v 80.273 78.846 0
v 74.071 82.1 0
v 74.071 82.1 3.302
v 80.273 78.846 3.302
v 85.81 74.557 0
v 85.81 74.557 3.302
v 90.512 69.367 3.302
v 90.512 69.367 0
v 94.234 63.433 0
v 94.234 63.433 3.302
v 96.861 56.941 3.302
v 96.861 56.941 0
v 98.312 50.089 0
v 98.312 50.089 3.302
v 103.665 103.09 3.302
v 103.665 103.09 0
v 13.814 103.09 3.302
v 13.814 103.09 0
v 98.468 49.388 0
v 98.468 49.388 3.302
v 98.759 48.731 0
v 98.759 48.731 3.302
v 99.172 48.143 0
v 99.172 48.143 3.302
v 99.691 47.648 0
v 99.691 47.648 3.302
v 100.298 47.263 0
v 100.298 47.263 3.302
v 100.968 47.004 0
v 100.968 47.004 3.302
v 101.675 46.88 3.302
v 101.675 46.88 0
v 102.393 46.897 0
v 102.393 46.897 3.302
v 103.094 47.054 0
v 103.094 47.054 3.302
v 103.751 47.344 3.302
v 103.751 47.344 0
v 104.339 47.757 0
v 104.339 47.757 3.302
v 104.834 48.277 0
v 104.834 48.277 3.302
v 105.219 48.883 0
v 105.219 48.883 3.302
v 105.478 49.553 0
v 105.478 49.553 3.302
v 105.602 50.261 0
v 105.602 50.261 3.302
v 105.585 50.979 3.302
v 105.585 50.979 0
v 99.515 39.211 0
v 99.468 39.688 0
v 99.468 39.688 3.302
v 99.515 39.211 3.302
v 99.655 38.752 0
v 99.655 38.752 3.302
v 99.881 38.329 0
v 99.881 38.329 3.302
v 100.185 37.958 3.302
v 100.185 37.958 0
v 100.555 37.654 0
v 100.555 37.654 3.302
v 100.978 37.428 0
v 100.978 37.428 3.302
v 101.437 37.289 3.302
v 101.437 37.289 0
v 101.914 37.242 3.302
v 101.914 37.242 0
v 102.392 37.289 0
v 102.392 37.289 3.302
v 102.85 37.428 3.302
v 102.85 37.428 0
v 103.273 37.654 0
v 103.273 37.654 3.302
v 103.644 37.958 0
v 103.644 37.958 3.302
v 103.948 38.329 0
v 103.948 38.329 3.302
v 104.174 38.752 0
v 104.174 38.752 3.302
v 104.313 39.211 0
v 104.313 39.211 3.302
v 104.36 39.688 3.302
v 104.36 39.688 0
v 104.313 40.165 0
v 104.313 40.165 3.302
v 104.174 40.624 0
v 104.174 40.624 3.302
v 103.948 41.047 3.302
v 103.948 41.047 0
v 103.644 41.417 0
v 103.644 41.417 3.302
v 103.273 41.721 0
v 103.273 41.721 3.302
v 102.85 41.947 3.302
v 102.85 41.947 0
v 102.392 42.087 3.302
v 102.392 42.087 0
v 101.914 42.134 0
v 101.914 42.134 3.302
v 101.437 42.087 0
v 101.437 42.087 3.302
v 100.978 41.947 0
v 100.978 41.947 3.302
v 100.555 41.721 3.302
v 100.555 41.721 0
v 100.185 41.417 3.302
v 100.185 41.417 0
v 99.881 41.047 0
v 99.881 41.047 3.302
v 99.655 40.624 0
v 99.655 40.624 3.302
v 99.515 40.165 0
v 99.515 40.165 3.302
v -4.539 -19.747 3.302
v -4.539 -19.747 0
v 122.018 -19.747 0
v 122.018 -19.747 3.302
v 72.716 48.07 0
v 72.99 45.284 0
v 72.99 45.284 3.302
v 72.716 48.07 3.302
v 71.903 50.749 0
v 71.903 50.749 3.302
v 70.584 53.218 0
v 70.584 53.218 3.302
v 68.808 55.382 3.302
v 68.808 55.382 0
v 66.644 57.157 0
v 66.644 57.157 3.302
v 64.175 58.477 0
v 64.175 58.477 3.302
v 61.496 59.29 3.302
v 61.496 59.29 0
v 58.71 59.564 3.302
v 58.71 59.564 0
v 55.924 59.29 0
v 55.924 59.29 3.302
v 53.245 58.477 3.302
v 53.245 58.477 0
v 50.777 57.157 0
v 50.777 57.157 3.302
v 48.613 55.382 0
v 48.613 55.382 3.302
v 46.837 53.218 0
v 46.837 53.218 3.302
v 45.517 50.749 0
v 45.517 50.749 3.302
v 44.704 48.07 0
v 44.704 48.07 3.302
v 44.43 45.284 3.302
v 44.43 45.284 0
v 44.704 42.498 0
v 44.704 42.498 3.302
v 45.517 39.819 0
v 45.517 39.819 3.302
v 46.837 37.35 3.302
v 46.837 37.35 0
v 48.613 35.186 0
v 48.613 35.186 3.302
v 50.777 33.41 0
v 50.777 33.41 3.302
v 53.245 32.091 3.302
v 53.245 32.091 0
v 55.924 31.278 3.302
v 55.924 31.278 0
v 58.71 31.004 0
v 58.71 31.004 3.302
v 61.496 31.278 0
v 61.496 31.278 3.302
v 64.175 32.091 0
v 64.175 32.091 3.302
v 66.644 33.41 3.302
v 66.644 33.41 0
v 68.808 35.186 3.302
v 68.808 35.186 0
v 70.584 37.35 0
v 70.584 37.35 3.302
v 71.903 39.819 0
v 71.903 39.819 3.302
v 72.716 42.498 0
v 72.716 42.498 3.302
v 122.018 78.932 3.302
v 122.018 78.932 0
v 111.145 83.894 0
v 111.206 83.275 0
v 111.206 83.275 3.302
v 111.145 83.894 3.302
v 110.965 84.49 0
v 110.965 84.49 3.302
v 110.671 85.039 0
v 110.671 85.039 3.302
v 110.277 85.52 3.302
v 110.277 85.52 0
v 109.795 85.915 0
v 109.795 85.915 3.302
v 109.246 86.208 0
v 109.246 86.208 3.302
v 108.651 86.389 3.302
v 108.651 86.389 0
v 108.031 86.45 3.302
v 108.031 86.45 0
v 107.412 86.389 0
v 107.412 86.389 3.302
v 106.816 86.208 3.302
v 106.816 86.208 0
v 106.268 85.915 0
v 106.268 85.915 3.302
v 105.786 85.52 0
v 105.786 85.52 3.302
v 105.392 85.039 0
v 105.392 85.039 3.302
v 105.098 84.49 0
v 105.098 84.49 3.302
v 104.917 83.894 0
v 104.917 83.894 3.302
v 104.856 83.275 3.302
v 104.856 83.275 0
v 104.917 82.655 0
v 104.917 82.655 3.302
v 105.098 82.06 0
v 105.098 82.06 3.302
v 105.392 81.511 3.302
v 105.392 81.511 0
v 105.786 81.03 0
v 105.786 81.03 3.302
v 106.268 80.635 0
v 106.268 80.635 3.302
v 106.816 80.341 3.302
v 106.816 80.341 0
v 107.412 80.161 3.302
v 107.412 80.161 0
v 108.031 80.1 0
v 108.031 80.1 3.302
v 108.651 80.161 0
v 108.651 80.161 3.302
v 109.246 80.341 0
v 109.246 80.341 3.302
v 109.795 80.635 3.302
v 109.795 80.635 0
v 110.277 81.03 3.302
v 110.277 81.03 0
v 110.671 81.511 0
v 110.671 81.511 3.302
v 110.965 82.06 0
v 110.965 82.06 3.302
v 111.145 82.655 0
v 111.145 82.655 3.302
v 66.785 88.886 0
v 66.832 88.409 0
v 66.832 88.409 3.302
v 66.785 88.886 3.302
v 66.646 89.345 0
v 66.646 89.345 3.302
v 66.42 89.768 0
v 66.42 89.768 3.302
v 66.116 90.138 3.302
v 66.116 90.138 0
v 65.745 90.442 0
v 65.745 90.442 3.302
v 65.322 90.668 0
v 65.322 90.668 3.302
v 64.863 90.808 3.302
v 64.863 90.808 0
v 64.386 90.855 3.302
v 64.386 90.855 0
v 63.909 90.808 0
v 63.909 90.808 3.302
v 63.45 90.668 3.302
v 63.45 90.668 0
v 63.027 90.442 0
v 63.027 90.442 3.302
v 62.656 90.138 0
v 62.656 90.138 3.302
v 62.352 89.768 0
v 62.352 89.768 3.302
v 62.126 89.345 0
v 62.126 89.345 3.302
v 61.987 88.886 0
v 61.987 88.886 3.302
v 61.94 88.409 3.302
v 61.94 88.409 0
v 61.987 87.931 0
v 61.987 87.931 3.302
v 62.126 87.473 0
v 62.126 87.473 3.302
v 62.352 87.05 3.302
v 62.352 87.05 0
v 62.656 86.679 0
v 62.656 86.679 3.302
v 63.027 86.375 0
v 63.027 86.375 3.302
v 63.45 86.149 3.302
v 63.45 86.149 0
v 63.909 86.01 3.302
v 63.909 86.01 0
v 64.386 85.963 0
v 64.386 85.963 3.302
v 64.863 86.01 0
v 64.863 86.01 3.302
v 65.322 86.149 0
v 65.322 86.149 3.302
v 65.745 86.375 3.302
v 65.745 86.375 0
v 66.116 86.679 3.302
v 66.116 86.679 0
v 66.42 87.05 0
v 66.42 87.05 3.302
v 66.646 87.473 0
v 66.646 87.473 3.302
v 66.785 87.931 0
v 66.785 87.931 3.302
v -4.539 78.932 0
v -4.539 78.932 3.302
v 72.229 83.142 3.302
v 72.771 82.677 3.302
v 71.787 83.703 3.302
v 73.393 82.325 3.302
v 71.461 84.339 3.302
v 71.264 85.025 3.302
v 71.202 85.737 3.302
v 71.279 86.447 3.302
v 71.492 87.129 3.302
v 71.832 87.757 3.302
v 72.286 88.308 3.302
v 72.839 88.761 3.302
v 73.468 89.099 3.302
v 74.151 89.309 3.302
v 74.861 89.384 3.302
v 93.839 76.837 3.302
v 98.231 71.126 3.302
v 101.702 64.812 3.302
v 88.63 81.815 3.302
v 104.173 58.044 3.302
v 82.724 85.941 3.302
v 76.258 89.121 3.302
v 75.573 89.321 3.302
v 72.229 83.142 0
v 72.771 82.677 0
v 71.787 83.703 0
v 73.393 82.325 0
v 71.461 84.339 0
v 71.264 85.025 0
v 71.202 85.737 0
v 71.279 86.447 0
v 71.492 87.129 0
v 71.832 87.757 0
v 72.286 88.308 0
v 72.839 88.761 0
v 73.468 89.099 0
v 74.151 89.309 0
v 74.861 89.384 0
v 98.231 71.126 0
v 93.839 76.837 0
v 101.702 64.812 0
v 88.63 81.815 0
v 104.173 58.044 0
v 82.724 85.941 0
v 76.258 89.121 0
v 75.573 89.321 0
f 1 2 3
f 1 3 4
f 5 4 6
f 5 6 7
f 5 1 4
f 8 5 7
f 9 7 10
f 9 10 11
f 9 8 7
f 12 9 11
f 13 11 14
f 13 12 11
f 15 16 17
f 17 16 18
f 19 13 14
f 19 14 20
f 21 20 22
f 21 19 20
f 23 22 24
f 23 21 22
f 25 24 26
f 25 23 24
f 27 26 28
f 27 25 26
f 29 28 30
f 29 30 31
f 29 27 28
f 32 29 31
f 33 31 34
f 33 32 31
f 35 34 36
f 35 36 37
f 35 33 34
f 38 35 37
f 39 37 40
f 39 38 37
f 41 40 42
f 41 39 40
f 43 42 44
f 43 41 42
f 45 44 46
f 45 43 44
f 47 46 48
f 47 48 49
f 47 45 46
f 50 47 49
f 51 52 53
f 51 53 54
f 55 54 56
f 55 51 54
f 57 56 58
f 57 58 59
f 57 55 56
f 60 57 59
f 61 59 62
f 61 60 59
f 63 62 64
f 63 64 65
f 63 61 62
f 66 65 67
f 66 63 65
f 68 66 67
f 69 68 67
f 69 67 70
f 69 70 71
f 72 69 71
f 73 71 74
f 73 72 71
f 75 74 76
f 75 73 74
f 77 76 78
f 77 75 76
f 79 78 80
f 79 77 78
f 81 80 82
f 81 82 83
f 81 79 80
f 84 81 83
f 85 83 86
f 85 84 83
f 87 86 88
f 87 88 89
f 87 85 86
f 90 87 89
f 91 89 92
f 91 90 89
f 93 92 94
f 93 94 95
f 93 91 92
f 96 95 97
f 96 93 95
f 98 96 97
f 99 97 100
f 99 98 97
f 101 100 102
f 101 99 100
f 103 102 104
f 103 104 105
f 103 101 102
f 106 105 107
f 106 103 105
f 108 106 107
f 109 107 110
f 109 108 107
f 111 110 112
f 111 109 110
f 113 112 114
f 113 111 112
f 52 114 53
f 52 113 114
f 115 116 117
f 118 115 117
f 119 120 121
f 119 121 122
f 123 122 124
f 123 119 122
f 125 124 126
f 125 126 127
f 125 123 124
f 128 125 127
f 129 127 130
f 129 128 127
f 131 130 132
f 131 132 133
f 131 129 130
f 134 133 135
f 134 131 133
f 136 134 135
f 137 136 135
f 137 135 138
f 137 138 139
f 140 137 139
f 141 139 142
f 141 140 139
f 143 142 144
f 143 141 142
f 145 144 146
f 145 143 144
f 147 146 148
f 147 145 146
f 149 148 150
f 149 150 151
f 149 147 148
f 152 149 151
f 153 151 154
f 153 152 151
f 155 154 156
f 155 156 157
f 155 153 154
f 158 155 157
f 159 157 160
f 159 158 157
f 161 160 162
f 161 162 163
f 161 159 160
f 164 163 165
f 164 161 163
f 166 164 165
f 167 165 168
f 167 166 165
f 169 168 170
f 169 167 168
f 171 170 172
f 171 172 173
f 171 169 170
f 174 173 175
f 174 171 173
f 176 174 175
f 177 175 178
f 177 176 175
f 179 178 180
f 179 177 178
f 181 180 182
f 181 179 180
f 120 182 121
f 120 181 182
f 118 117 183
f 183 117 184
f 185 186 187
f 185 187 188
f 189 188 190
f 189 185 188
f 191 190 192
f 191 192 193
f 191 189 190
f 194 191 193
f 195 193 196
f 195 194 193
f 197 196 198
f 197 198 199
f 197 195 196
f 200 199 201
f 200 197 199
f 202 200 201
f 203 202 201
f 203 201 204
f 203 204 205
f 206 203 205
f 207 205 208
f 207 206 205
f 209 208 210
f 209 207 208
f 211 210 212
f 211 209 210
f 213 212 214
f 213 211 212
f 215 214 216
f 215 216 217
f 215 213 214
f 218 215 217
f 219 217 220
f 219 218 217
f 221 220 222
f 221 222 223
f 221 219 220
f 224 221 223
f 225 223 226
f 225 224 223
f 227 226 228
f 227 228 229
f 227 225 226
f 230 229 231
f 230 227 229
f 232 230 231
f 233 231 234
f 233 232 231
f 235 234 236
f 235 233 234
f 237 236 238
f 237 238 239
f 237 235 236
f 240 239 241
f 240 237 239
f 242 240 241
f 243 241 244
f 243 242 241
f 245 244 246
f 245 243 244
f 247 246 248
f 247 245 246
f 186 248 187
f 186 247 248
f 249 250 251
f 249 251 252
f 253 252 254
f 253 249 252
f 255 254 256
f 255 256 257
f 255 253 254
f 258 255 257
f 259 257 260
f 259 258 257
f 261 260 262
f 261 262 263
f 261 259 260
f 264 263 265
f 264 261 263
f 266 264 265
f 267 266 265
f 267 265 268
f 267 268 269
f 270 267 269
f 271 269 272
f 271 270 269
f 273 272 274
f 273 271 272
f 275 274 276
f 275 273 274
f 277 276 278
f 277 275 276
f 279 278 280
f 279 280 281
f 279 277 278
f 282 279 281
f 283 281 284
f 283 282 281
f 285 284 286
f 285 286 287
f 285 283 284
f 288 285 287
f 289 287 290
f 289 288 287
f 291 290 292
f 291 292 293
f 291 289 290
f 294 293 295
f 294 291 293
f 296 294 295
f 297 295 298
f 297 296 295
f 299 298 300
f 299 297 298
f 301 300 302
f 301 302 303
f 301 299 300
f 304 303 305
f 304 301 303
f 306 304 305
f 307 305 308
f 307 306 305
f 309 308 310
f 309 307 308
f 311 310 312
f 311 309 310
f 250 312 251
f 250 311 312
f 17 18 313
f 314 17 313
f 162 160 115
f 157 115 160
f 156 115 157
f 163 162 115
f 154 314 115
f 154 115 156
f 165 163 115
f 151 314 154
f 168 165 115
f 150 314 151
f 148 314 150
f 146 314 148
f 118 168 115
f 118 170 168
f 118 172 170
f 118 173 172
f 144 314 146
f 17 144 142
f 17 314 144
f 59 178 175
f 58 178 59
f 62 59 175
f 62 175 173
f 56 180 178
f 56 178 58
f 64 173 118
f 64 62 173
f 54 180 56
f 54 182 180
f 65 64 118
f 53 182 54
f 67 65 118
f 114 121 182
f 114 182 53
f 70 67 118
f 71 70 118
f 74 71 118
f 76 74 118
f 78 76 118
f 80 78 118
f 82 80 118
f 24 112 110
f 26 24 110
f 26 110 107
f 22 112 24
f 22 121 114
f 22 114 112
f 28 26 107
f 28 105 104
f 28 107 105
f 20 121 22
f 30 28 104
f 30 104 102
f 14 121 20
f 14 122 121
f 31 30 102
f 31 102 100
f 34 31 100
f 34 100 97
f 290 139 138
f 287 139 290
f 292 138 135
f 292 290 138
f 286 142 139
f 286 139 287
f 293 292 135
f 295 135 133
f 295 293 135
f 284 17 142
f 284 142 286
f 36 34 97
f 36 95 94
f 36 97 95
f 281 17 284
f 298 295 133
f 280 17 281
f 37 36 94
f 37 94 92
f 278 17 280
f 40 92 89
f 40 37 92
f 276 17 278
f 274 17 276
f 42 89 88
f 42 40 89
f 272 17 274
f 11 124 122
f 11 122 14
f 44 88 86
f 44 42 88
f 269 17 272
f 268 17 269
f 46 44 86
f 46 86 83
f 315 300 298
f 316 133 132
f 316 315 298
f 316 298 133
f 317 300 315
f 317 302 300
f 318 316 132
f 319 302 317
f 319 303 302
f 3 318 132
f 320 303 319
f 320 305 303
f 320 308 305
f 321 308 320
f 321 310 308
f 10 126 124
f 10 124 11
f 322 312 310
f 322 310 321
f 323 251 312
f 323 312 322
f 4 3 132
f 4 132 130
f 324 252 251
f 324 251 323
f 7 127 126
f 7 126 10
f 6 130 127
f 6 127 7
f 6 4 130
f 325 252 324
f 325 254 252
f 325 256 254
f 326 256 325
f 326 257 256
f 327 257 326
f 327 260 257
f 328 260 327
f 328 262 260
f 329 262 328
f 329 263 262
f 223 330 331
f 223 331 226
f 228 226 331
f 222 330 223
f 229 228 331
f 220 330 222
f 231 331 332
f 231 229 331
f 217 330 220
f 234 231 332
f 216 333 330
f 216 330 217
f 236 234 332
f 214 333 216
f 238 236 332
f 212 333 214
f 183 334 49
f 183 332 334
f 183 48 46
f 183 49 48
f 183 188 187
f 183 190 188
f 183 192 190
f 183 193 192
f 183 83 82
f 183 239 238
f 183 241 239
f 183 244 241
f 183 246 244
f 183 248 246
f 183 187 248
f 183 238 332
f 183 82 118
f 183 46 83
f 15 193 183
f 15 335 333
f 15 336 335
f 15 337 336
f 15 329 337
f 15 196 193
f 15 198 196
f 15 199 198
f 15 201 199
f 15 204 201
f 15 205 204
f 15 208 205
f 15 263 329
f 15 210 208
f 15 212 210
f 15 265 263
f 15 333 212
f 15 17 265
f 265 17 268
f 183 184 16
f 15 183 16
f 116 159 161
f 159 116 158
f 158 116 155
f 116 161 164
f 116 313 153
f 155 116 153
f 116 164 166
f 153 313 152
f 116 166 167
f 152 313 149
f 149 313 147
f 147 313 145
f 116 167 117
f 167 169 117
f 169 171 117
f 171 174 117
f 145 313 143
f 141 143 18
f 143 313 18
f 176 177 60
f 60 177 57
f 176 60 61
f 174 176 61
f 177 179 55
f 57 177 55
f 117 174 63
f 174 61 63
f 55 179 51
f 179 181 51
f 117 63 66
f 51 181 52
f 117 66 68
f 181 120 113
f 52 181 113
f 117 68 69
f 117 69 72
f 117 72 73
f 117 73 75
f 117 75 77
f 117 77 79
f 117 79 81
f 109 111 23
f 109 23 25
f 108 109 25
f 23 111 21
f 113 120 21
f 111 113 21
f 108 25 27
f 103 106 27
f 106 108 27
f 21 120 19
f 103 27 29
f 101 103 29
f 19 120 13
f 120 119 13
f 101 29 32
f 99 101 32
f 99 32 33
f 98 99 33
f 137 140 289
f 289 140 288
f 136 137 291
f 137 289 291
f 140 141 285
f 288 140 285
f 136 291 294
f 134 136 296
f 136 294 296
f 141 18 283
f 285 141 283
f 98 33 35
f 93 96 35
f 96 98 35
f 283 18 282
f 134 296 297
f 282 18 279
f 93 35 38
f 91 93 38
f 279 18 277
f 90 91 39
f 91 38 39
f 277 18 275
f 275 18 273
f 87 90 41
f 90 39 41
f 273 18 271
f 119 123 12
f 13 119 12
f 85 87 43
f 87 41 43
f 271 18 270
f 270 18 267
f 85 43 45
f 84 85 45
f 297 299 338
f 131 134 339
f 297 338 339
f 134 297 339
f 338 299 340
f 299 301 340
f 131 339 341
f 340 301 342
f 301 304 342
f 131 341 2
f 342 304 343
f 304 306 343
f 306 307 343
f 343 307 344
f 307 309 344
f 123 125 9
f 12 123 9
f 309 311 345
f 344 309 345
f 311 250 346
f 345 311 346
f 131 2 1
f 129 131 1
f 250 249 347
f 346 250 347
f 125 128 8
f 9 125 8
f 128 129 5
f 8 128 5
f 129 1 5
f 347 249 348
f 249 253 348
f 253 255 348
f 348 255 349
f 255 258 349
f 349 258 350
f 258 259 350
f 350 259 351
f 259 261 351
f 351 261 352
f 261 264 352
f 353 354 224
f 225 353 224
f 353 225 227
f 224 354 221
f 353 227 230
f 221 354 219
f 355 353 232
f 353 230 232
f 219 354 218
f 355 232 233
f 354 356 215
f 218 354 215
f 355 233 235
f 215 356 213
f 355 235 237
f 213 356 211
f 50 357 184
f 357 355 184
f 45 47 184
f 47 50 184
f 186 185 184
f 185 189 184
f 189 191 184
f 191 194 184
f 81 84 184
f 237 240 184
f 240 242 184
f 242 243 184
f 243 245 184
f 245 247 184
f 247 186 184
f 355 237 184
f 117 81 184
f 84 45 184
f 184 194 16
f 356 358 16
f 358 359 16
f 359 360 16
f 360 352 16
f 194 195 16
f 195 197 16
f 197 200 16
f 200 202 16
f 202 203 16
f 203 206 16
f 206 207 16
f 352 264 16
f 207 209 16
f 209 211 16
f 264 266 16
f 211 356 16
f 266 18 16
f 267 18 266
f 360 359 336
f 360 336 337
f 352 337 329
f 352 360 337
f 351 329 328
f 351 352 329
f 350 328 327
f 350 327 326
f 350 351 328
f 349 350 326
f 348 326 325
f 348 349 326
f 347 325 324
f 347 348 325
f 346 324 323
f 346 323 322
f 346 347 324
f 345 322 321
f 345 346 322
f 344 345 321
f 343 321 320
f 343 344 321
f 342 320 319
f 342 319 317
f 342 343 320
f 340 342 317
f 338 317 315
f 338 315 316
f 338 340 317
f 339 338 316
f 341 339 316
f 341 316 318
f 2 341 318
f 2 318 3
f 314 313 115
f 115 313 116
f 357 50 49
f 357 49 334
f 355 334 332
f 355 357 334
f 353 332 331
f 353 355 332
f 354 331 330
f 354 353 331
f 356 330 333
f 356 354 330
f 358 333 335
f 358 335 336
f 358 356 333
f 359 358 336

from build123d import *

# Parameters (mm, degrees)
SKETCH1_R      = 14.280154621
SKETCH1_R_2    = 3.175
SKETCH1_R_3    = 2.445943814
EXTRUDE1_DEPTH = 3.302


with BuildPart() as part:
    # Sketch1 → Extrude1 (new body)
    with BuildSketch(Plane.XY):
        Polygon((122.018241697, 78.932176277), (103.665120274, 103.090232189), (13.814462921, 103.090232189), (-4.538658503, 78.932176277), (-4.538658503, -19.747260734), (122.018241697, -19.747260734), align=None)
        with Locations((58.710249945, 45.283910371)):
            Circle(SKETCH1_R, mode=Mode.SUBTRACT)
        with Locations((108.031447678, 83.274598732)):
            Circle(SKETCH1_R_2, mode=Mode.SUBTRACT)
        with Locations((64.386022104, 88.408658993)):
            Circle(SKETCH1_R_3, mode=Mode.SUBTRACT)
        with Locations(Location((101.914361119, 39.6877037, 0), (0, 0, 180))):
            Circle(SKETCH1_R_3, mode=Mode.SUBTRACT)
        with BuildLine():
            ThreePointArc((105.584923307, 50.978901238), (96.144059082, 74.065464486), (76.258457488, 89.121432379))
            ThreePointArc((76.258457488, 89.121432379), (71.3691103, 86.793097674), (74.070723534, 82.099682674))
            ThreePointArc((74.070723534, 82.099682674), (90.512346787, 69.36651562), (98.311501424, 50.088712183))
            ThreePointArc((98.311501424, 50.088712183), (102.393306893, 46.897095769), (105.584923307, 50.978901238))
        make_face(mode=Mode.SUBTRACT)
    extrude(amount=EXTRUDE1_DEPTH)


solid = part.part
